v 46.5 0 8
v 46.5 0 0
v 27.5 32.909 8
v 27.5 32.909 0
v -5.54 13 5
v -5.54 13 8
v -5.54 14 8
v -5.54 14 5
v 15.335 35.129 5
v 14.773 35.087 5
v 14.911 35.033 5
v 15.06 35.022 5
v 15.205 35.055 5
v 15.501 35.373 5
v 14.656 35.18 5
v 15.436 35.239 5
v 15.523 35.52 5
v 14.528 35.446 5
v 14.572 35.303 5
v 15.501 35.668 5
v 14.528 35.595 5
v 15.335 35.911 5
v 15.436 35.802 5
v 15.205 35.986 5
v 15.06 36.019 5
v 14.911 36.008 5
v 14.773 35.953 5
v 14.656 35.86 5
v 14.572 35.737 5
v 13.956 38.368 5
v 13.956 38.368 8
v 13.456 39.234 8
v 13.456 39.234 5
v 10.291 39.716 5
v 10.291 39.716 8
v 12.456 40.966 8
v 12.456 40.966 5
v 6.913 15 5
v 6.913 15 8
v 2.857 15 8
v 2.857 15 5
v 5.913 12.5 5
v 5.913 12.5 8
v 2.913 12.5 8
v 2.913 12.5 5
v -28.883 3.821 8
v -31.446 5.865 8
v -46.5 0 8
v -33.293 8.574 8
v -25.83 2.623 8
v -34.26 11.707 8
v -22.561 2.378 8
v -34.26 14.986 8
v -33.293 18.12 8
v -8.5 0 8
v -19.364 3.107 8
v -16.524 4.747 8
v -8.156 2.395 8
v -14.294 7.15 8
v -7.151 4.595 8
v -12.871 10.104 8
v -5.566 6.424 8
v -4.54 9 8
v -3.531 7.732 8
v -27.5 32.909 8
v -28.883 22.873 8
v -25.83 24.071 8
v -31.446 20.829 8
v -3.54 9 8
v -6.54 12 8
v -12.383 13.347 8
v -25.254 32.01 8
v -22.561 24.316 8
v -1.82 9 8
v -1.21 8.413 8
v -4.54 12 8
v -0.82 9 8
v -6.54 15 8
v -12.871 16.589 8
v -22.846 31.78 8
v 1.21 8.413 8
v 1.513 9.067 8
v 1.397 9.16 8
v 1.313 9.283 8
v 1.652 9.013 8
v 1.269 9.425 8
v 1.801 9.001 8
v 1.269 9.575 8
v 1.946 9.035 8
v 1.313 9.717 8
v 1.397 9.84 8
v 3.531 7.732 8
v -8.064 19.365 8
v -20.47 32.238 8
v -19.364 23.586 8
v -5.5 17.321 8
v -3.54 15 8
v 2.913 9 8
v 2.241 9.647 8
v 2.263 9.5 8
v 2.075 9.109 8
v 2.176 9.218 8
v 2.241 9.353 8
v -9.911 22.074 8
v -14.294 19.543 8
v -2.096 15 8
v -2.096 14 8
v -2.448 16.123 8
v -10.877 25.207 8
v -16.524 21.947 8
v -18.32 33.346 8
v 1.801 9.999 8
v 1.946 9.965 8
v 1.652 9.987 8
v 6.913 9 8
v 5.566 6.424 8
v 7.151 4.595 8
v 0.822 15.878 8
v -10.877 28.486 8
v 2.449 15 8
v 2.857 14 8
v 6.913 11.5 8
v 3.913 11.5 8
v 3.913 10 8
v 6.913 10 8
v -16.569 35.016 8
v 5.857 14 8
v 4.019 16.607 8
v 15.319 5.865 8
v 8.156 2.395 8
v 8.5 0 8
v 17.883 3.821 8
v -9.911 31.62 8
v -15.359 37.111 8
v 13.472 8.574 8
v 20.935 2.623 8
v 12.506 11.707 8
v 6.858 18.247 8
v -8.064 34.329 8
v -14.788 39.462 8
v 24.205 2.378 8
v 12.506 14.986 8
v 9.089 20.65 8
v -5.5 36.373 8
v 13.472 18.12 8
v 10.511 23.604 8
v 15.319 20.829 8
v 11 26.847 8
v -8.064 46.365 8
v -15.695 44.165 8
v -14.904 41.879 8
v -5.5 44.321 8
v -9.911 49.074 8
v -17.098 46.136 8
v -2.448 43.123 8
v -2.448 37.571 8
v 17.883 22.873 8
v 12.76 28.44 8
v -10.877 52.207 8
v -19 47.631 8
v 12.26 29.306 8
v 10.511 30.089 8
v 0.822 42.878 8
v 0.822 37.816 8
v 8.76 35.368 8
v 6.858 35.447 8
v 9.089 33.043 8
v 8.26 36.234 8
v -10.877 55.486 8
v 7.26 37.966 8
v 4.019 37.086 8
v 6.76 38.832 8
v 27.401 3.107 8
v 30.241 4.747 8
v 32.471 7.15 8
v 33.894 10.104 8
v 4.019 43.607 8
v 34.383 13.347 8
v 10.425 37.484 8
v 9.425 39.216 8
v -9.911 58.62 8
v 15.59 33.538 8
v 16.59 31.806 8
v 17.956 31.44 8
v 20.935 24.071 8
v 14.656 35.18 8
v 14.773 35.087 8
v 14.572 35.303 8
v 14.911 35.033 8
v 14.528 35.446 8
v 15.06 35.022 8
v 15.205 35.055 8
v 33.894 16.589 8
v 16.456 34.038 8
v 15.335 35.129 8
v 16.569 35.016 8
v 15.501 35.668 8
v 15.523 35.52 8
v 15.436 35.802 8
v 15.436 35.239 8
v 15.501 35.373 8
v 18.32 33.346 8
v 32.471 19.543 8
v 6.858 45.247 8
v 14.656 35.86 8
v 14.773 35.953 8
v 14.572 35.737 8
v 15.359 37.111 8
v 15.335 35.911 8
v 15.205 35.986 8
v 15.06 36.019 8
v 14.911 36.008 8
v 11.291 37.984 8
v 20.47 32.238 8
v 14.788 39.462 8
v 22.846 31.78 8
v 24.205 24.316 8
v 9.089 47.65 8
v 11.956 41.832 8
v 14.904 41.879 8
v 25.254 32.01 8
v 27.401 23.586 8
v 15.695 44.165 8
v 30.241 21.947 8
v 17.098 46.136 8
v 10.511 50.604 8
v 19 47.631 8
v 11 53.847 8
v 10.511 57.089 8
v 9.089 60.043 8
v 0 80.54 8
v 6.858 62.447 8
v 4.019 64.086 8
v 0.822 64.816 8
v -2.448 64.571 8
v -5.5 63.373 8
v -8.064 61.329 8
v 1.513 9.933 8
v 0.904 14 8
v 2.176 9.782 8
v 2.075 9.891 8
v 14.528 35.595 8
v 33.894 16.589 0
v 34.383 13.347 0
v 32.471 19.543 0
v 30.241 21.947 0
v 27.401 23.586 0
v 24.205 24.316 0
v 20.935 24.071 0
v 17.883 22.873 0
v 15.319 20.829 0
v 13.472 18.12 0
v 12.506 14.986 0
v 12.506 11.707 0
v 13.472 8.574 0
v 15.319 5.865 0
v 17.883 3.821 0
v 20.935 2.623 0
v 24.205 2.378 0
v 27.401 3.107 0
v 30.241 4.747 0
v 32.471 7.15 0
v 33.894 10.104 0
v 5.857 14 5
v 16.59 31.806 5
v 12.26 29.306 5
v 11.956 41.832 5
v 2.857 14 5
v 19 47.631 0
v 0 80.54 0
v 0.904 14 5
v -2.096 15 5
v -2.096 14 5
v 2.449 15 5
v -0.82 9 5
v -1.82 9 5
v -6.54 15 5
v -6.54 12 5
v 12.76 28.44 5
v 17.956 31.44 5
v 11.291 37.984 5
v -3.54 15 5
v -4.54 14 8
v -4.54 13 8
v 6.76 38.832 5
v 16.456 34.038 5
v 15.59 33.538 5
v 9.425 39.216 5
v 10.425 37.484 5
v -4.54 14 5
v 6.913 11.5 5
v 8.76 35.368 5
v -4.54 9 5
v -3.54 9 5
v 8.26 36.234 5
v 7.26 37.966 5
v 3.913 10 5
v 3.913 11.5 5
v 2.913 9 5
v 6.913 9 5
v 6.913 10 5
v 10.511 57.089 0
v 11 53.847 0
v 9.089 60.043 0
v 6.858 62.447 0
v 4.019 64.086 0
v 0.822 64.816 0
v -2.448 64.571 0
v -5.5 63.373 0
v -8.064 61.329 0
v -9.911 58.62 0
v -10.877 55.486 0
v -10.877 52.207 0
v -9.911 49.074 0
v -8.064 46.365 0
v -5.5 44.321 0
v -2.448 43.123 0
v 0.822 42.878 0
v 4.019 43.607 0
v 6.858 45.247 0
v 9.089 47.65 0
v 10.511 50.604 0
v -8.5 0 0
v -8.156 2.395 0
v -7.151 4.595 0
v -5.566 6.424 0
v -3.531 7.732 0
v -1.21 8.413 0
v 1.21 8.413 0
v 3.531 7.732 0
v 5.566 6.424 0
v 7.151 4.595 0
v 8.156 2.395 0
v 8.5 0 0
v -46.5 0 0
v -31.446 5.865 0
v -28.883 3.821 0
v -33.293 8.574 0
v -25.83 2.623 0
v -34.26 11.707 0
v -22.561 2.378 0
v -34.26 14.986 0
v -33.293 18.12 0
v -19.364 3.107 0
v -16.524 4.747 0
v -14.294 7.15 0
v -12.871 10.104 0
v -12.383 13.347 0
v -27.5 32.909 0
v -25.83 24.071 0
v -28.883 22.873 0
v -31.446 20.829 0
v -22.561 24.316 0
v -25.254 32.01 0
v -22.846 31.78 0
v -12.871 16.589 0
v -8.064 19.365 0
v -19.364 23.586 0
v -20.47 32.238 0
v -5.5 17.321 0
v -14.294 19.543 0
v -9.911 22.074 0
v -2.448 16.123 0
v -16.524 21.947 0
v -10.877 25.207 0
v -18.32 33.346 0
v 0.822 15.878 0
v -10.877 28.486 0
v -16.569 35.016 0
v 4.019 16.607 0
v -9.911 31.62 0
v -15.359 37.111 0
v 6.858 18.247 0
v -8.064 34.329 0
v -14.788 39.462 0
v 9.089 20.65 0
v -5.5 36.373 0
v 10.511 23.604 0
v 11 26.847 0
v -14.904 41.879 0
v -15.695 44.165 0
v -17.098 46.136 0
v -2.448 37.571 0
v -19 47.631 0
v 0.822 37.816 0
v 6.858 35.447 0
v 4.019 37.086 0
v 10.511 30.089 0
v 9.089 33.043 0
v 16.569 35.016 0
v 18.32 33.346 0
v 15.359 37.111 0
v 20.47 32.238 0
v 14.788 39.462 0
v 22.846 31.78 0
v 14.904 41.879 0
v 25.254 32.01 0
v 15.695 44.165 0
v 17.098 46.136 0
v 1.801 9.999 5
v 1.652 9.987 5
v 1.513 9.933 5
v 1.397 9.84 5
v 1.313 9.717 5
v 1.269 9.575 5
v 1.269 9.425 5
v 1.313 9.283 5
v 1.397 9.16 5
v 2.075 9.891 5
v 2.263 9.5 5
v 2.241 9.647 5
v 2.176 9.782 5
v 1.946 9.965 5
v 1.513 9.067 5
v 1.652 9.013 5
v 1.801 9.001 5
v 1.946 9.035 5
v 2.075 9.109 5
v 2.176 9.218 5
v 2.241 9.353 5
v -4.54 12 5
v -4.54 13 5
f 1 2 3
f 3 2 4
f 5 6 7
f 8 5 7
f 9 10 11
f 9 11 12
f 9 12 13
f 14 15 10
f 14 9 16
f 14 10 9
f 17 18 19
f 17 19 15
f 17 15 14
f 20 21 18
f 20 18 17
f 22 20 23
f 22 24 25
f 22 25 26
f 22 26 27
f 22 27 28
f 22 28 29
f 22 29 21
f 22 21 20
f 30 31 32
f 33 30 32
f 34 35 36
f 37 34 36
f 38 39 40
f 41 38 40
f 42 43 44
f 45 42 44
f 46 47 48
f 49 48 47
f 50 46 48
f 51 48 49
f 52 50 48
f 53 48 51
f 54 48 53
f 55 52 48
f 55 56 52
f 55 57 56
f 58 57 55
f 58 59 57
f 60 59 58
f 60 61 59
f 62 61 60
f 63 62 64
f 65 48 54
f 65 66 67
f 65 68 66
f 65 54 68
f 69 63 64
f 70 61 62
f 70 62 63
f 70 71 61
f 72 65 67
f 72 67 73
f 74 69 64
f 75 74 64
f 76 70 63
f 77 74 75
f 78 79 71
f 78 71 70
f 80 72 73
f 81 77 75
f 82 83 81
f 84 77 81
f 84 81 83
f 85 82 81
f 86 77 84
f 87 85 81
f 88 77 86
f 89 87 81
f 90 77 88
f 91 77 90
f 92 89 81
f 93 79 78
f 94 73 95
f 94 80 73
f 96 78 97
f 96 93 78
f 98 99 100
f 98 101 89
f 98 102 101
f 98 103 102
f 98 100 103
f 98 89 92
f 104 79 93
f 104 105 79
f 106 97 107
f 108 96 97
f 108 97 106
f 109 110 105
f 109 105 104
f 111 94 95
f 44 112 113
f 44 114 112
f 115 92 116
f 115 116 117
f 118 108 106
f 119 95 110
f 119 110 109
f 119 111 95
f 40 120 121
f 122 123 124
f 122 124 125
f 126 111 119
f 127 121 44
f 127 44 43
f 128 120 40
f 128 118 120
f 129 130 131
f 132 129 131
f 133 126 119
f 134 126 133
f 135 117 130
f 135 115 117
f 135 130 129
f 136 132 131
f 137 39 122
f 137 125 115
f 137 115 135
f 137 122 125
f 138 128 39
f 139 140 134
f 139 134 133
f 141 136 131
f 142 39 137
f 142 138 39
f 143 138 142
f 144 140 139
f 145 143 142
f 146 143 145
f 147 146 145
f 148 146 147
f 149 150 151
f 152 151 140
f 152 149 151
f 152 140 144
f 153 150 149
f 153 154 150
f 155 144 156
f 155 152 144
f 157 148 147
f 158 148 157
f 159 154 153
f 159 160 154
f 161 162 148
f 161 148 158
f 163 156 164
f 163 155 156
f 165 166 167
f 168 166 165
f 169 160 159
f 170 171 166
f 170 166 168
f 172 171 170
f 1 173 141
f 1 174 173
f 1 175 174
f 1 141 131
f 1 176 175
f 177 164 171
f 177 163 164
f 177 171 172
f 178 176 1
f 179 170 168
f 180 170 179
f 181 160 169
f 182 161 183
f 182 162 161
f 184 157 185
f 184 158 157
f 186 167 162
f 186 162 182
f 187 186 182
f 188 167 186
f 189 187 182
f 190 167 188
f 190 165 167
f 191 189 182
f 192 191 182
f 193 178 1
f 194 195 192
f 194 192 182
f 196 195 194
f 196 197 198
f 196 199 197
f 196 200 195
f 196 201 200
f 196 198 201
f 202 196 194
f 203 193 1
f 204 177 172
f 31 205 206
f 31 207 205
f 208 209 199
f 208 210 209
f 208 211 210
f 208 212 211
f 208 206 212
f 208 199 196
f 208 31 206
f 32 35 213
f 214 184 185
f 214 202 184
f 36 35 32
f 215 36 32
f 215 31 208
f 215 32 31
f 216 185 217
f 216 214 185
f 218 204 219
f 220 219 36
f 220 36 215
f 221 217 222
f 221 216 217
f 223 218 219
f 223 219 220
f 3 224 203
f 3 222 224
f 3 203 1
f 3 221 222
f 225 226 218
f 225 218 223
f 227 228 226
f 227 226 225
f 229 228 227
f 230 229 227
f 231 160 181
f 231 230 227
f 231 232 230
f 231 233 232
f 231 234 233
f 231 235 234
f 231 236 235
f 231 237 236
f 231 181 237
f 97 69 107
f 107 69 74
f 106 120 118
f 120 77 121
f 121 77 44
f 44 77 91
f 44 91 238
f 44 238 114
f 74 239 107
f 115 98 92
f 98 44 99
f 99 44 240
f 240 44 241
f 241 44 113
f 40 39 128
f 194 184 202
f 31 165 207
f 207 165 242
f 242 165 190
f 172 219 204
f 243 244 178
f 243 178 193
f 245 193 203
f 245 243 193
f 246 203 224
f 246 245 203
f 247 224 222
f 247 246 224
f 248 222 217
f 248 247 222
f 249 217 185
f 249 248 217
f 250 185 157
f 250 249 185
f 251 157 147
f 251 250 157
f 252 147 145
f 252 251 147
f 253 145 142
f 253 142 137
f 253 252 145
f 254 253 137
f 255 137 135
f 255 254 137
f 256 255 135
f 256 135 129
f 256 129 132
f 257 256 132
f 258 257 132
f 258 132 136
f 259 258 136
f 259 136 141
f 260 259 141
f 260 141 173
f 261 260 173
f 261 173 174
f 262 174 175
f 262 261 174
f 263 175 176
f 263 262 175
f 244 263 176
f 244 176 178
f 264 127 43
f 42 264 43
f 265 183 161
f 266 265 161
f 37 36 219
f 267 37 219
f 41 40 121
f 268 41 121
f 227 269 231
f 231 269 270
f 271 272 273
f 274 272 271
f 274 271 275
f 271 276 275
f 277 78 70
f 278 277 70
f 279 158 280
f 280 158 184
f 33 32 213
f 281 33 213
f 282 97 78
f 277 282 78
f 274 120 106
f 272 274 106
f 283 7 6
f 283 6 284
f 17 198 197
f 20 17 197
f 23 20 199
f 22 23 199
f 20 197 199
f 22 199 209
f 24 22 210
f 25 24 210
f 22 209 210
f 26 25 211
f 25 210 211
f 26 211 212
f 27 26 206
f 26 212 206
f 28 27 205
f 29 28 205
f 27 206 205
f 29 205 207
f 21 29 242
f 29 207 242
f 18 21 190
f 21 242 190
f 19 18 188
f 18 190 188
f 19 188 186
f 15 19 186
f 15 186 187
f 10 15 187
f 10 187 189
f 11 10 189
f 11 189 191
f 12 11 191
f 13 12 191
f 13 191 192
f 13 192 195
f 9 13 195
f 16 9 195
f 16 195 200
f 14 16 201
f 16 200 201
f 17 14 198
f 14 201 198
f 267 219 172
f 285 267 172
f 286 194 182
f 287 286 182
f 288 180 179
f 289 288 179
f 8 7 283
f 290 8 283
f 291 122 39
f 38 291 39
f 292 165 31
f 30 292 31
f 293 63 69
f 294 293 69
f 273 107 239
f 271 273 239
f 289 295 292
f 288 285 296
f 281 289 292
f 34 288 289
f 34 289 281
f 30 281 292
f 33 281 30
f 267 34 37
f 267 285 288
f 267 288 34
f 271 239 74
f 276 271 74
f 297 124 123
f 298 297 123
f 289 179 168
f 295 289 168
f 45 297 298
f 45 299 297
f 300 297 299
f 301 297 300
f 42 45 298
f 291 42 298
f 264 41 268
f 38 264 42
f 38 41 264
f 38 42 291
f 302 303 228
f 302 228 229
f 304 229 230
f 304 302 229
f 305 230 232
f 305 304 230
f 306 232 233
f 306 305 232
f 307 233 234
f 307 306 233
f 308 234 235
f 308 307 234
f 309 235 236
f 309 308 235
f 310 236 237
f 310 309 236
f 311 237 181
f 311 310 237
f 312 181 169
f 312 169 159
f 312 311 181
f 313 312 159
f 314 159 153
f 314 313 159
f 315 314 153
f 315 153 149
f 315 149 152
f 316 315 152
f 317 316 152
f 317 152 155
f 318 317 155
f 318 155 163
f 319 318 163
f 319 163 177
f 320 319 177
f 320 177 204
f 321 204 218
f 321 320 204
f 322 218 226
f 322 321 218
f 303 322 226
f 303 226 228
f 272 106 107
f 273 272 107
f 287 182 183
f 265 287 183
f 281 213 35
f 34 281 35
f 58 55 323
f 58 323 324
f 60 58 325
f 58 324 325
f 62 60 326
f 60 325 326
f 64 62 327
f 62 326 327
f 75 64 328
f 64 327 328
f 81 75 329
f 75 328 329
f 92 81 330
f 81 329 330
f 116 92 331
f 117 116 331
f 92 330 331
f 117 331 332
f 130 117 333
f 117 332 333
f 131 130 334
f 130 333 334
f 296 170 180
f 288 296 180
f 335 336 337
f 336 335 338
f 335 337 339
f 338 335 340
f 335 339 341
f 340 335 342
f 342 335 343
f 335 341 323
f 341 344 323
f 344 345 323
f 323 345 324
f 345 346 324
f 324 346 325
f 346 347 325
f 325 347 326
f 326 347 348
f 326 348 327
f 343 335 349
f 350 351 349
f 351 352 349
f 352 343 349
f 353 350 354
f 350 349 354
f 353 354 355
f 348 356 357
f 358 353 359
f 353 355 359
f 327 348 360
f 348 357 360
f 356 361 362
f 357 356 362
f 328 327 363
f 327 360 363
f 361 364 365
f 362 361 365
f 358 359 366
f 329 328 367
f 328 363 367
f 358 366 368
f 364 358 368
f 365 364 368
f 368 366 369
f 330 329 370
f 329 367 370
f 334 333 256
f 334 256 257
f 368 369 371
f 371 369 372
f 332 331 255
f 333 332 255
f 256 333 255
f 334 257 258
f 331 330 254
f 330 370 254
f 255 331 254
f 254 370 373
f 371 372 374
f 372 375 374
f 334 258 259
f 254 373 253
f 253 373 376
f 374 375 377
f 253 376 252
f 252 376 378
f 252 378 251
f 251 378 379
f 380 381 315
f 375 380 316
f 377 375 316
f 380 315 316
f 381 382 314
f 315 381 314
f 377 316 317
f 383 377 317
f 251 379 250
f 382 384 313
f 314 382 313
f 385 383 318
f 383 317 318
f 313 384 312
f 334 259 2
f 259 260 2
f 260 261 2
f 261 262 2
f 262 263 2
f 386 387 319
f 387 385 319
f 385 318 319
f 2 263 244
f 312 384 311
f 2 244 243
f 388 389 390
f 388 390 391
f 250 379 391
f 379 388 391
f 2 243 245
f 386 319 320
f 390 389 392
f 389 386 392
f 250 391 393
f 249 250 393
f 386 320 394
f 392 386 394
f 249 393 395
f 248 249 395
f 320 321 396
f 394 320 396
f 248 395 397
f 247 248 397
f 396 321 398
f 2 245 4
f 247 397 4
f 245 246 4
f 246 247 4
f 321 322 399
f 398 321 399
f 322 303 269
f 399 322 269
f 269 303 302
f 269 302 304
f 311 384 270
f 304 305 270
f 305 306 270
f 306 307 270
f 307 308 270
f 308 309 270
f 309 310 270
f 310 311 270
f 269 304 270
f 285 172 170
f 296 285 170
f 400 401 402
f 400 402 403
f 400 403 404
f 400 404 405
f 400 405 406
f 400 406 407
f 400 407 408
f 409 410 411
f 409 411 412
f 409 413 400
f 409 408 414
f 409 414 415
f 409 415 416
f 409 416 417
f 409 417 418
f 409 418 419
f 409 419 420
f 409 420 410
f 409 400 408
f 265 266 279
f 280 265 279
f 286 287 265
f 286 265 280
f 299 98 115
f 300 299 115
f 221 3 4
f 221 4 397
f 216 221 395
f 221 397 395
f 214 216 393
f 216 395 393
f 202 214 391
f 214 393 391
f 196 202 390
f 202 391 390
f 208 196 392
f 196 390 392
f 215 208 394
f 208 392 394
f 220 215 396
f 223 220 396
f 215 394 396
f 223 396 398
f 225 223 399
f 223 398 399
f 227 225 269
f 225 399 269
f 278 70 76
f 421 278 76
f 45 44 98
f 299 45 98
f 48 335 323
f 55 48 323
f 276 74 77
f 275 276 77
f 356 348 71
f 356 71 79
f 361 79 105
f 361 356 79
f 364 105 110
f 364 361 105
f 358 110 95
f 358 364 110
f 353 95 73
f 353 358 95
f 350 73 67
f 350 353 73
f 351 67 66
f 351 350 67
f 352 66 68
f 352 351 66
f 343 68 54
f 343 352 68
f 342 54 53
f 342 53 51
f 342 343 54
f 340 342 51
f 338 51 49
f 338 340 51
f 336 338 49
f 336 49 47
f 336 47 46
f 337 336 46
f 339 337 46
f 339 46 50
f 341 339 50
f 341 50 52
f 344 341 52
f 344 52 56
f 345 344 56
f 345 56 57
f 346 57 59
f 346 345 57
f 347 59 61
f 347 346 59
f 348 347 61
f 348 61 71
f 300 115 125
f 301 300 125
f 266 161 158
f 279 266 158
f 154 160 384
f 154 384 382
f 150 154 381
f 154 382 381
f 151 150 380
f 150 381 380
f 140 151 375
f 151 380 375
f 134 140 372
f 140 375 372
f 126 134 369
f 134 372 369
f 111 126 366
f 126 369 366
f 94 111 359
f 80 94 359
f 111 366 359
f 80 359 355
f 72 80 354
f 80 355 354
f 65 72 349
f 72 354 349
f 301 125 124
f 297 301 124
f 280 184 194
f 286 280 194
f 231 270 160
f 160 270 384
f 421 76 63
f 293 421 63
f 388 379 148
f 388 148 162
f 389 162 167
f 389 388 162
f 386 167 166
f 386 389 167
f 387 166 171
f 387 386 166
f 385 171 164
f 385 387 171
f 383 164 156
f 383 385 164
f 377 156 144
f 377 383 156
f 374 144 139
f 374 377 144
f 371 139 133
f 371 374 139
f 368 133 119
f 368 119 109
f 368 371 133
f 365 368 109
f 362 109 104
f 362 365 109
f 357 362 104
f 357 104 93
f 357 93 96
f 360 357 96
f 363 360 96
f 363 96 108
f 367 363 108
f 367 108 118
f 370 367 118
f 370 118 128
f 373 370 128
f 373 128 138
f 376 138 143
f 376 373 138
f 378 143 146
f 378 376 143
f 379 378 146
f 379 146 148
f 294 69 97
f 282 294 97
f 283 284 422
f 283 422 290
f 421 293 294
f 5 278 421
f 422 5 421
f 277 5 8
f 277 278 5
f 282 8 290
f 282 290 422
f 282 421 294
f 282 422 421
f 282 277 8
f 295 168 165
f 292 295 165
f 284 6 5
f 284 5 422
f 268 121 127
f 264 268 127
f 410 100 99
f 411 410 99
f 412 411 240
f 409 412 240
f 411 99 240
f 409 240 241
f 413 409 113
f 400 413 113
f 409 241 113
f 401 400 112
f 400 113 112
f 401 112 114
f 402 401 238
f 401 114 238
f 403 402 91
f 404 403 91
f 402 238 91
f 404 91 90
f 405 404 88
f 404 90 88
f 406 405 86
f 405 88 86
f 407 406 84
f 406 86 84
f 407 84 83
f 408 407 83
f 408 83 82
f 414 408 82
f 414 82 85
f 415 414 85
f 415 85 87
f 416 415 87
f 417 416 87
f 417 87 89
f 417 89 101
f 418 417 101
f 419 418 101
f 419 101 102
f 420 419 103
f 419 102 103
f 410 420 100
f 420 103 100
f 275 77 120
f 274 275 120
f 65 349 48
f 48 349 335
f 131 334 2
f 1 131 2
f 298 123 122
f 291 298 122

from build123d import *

# Parameters (mm, degrees)
F0_R     = 11
F1_DEPTH = 8
F2_W     = 1
F2_H     = 1
F2_R     = 0.5
F3_DEPTH = 3


with BuildPart() as f1:
    # F0 (on Top) → F1 (new body)
    with BuildSketch(Plane.XY):
        with BuildLine():
            ThreePointArc((-8.5, 0), (0, 8.5), (8.5, 0))
            Line((8.5, 0), (46.5, 0))
            Line((46.5, 0), (27.5, 32.908965))
            ThreePointArc((27.5, 32.908965), (15.888784, 36.020181), (19, 47.631397))
            Line((19, 47.631397), (0, 80.540363))
            Line((0, 80.540363), (-19, 47.631397))
            ThreePointArc((-19, 47.631397), (-15.888784, 36.020181), (-27.5, 32.908965))
            Line((-27.5, 32.908965), (-46.5, 0))
            Line((-46.5, 0), (-8.5, 0))
        make_face()
        with Locations((-23.382686, 13.346788)):
            Circle(F0_R, mode=Mode.SUBTRACT)
        with Locations((23.382686, 13.346788)):
            Circle(F0_R, mode=Mode.SUBTRACT)
        with Locations((0, 26.846788)):
            Circle(F0_R, mode=Mode.SUBTRACT)
        with Locations((0, 53.846788)):
            Circle(F0_R, mode=Mode.SUBTRACT)
    extrude(amount=F1_DEPTH)

    # F2 (on face) → F3 (cut)
    with BuildSketch(Plane.XY.offset(8)):
        Polygon((-6.540234, 12), (-4.540234, 12), (-4.540234, 9), (-3.540234, 9), (-3.540234, 12), (-3.540234, 15), (-6.540234, 15), align=None)
        with Locations((-5.040234, 13.5)):
            Rectangle(F2_W, F2_H, mode=Mode.SUBTRACT)
        Polygon((2.449274, 14.999983), (-2.095626, 14.999983), (-2.095626, 13.999983), (0.904374, 13.999983), (-1.820119, 9), (-0.820119, 9), align=None)
        Polygon((2.912836, 9), (6.912836, 9), (6.912836, 10), (3.912836, 10), (3.912836, 11.5), (6.912836, 11.5), (6.912836, 14.999983), (2.857154, 14.999983), (2.857154, 13.999983), (5.857154, 13.999983), (5.912836, 12.5), (2.912836, 12.5), (2.912836, 11.5), align=None)
        Polygon((8.759619, 35.368257), (13.955771, 38.368257), (13.455771, 39.234283), (11.290708, 37.984283), (10.290708, 39.716334), (12.455771, 40.966334), (11.955771, 41.832359), (6.759619, 38.832359), (7.259619, 37.966334), (9.424682, 39.216334), (10.424682, 37.484283), (8.259619, 36.234283), align=None)
        with Locations((1.763236, 9.5)):
            Circle(F2_R)
        with Locations((15.022759, 35.520181)):
            Circle(F2_R)
        Polygon((12.759619, 28.440054), (17.955771, 31.440054), (16.455771, 34.03813), (15.589746, 33.53813), (16.589746, 31.80608), (12.259619, 29.30608), align=None)
    extrude(amount=-F3_DEPTH, mode=Mode.SUBTRACT)


solid = f1.part
